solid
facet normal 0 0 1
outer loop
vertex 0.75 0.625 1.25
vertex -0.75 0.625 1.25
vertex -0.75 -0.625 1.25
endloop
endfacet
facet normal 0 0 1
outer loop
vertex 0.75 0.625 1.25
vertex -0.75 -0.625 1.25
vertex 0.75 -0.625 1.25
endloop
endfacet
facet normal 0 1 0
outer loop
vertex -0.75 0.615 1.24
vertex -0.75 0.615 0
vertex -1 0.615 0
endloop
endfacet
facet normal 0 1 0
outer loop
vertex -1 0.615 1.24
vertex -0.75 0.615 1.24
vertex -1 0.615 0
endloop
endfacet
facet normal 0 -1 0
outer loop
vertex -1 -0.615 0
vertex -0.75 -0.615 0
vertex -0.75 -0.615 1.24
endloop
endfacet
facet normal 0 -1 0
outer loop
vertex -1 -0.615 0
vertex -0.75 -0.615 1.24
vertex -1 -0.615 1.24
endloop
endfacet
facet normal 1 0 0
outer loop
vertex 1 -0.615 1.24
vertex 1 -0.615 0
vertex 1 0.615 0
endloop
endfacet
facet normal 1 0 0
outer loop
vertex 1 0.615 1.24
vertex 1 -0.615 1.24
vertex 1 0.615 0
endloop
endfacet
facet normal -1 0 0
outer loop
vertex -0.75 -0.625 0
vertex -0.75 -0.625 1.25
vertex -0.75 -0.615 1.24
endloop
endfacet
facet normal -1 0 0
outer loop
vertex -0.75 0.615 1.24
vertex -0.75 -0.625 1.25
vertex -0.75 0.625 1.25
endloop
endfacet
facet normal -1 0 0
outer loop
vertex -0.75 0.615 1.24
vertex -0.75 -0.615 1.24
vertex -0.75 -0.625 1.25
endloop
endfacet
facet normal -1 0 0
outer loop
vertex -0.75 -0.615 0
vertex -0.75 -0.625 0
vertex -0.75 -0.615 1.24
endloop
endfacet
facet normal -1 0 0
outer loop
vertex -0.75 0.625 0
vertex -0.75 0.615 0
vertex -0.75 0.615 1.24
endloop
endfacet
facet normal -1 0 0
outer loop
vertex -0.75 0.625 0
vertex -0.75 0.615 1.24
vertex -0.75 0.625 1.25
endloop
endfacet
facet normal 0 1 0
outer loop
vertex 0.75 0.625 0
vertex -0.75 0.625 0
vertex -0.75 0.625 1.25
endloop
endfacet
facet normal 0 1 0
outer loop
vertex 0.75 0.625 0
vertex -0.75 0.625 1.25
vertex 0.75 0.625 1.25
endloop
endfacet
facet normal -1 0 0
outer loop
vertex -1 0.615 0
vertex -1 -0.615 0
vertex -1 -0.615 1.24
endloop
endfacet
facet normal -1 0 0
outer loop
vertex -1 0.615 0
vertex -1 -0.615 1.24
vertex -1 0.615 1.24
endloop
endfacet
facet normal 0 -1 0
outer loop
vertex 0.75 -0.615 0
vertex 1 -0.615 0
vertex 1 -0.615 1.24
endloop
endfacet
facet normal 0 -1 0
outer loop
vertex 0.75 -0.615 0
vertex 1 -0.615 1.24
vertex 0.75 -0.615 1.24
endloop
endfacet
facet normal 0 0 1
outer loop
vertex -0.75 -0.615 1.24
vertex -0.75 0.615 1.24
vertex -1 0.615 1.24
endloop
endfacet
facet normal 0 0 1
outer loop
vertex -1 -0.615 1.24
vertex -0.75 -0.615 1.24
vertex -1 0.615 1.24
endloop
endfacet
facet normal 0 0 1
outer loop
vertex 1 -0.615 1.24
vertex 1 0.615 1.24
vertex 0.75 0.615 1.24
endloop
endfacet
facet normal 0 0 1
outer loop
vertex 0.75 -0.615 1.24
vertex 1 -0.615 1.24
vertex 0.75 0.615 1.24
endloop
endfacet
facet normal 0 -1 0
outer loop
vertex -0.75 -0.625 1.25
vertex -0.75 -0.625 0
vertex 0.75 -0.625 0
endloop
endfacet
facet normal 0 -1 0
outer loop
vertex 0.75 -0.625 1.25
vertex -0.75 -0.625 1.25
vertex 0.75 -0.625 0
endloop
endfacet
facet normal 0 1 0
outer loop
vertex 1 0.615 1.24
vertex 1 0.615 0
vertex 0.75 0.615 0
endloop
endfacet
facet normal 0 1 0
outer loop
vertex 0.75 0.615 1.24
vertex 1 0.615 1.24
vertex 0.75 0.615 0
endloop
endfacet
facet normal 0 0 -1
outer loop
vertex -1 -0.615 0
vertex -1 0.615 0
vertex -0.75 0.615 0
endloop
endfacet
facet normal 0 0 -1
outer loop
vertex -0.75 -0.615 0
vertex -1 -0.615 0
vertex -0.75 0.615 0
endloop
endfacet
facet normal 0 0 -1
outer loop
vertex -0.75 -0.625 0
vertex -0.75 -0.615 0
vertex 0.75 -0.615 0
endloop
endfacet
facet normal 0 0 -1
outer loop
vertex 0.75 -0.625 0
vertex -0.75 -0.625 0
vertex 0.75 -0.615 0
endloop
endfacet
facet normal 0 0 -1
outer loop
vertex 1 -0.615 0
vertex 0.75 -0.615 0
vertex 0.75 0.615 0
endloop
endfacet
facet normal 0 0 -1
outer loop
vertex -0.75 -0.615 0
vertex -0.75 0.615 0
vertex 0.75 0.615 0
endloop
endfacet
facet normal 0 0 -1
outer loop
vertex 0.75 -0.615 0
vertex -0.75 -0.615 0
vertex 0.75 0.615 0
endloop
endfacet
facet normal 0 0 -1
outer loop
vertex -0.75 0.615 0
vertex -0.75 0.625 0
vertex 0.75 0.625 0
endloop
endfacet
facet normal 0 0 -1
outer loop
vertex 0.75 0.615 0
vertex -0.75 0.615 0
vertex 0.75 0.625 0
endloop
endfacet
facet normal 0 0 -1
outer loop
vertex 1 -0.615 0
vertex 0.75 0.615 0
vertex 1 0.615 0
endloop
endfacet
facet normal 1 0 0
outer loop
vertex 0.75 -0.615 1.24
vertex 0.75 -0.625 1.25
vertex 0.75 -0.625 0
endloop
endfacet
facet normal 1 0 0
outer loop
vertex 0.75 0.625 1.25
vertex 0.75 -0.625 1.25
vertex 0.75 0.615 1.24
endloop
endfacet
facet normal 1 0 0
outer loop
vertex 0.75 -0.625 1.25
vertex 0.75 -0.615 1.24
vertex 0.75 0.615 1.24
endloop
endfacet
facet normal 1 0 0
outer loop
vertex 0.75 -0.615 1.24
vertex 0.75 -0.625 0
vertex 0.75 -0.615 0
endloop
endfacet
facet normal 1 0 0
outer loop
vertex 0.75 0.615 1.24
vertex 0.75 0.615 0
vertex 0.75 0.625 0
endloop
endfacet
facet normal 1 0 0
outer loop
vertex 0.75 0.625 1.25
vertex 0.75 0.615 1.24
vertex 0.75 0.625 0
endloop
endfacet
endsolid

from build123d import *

# Parameters (mm, degrees)
SKETCH1_W           = 1.5
SKETCH1_H           = 1.25
BOSS_EXTRUDE1_DEPTH = 1.25
SKETCH4_W           = 0.25
SKETCH4_H           = 1.23
BOSS_EXTRUDE3_DEPTH = 1.24


with BuildPart() as part:
    # Sketch1 → Boss-Extrude1 (new body)
    with BuildSketch(Plane.XY):
        Rectangle(SKETCH1_W, SKETCH1_H)
    extrude(amount=BOSS_EXTRUDE1_DEPTH)

    # Sketch4 → Boss-Extrude3 (add)
    with BuildSketch(Plane(origin=(0, 0, 0), x_dir=(-1, 0, 0), z_dir=(0, 0, -1))):
        with Locations((-0.875, 0)):
            Rectangle(SKETCH4_W, SKETCH4_H)
        with Locations((0.875, 0)):
            Rectangle(SKETCH4_W, SKETCH4_H)
    extrude(amount=-BOSS_EXTRUDE3_DEPTH)


solid = part.part
